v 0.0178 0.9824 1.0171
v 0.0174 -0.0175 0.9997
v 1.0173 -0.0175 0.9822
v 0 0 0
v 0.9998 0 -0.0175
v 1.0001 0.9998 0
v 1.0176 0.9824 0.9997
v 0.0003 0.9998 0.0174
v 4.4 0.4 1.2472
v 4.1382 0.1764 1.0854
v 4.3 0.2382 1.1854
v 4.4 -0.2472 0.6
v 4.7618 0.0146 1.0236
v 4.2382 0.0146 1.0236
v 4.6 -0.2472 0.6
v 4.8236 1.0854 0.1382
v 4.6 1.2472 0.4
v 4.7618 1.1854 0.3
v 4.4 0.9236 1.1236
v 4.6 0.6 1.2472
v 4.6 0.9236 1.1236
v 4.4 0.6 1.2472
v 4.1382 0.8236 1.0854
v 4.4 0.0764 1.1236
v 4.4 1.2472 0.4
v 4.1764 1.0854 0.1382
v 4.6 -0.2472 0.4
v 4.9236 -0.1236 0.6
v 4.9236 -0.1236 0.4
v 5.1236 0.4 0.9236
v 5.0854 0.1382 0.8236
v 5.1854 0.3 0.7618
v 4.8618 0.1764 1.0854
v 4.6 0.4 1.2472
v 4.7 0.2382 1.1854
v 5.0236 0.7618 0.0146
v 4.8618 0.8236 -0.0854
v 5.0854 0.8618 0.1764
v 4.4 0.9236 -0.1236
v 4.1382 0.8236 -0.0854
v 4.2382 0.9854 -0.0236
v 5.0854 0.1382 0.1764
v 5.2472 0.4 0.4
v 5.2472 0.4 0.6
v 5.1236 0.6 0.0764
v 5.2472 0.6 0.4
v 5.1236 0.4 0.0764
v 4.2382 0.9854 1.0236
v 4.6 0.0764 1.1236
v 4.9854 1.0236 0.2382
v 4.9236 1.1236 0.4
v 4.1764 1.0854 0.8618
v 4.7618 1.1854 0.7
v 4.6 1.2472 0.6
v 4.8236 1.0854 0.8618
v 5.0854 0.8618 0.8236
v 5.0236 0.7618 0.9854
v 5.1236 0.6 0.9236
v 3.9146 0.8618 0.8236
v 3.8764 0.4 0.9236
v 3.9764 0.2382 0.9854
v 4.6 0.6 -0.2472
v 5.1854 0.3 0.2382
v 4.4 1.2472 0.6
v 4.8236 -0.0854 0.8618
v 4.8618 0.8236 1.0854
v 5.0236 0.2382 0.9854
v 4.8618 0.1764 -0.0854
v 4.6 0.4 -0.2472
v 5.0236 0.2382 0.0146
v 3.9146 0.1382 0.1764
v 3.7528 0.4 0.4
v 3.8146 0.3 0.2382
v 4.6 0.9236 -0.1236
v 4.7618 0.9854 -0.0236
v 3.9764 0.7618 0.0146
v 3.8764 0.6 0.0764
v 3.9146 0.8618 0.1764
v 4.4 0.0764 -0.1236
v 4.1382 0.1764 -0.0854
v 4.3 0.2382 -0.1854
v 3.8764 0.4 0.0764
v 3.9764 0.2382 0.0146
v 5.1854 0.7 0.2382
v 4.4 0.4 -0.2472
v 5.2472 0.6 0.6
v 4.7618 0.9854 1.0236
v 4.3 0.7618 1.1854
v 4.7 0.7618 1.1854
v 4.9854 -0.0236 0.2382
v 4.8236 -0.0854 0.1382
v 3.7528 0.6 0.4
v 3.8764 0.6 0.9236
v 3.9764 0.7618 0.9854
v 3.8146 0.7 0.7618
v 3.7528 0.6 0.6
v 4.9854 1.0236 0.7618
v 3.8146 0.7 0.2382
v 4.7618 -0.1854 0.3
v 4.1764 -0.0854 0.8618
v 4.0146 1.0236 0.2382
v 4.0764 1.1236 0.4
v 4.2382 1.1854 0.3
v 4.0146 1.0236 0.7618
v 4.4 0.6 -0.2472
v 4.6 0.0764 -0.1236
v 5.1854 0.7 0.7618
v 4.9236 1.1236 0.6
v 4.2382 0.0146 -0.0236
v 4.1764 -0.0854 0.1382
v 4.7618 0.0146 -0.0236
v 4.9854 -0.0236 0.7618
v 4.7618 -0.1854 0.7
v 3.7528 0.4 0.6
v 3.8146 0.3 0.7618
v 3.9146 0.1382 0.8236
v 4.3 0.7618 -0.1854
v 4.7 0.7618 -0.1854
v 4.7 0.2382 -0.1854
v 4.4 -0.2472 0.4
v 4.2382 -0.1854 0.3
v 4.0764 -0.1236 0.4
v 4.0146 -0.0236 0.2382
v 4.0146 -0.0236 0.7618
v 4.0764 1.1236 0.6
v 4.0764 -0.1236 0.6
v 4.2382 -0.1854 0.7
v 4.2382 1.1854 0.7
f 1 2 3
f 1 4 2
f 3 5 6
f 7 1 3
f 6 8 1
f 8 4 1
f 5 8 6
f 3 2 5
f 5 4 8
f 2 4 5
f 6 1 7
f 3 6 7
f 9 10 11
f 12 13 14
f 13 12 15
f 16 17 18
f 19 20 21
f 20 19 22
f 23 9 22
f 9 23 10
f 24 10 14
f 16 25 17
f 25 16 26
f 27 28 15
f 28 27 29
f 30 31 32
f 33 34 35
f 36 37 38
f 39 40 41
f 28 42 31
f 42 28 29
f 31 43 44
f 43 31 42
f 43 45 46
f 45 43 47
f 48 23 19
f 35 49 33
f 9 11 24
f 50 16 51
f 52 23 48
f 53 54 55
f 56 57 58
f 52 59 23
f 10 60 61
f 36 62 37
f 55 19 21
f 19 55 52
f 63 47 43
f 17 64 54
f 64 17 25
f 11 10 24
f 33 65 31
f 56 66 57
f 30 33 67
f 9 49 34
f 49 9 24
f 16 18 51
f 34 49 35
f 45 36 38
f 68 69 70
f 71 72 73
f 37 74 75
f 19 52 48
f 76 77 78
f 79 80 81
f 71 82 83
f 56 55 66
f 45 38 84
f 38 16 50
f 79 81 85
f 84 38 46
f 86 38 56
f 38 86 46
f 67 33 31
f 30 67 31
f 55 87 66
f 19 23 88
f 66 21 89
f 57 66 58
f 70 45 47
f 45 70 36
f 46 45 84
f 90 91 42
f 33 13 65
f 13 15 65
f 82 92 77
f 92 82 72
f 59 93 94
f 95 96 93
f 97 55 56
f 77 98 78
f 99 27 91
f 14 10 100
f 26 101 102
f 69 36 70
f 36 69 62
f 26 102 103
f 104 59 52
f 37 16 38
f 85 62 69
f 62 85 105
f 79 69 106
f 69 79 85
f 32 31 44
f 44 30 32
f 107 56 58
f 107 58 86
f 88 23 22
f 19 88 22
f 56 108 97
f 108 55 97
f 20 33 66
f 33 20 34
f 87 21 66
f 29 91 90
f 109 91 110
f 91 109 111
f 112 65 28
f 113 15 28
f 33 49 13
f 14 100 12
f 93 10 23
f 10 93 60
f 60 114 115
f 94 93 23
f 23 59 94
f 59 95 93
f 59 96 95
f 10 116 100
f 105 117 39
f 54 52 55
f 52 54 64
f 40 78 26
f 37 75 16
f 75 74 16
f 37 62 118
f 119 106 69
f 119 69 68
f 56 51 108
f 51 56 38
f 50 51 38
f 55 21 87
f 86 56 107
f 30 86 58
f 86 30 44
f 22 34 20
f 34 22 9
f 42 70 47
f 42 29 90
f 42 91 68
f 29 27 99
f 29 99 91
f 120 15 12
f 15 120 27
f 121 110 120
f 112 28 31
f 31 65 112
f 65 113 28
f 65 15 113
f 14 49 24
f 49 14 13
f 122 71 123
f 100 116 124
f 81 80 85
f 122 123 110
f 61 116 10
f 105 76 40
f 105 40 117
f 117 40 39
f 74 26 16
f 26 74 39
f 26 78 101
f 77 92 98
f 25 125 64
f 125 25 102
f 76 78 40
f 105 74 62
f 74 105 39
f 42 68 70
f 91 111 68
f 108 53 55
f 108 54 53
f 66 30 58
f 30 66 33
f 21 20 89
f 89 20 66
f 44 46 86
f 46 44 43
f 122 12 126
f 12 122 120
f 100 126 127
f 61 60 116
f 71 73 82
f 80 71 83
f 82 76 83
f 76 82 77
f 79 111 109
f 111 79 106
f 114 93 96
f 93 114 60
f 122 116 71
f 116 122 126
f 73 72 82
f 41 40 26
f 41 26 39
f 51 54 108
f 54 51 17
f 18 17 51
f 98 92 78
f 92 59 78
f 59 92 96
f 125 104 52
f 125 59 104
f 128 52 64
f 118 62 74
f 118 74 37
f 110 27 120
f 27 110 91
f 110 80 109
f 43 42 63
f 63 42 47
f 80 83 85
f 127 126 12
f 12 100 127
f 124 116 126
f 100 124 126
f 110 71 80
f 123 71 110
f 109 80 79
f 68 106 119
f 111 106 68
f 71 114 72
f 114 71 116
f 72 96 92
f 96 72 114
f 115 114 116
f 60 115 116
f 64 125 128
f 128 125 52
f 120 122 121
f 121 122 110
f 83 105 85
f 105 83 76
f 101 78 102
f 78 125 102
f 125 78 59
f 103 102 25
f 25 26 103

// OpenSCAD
// Used to cause issue #349

// Very slightly non-planar polyhedron
polyhedron(faces=[[3,2,1,0],[7,6,5,4],[0,1,6,7],[1,2,5,6],[2,3,4,5],[3,0,7,4]],
points=[
    [0.0174497,-0.0174524,0.999695],
    [1.0173,-0.0174524,0.982243],
    [1.0176,0.982395,0.999693],
    [0.0177543,0.982395,1.01715],
    [0.000304586,0.999848,0.0174497],
    [1.00015,0.999848,-0.00000265809],
    [0.999848,-0.0000000000000271051,-0.0174524],
    [0,0,0]]);

// Really non-planar polyhedron
translate([2,0,0]) polyhedron(faces=[[3,2,1,0],[7,6,5,4],[0,1,6,7],[1,2,5,6],[2,3,4,5],[3,0,7,4]],
points=[
    [0,0,1],
    [1,0.2,1],
    [1,1,1],
    [0,1,1],
    [0,1,0],
    [1,1,0],
    [1,0,0],
    [0,0,0]]);

// Real-world example: truncated icosidodecahedron
translate([4.5,0.5,0.5]) scale(0.02) polyhedron(points = [
[-10., -13.090169943749475, -34.270509831248425], 
[-10., -13.090169943749475, 34.270509831248425], 
[-10., 13.090169943749475, -34.270509831248425], 
[-10., 13.090169943749475, 34.270509831248425], 
[-5., -5., -37.3606797749979], [-5., -5., 37.3606797749979], 
[-5., 5., -37.3606797749979], [-5., 5., 37.3606797749979], 
[-5., -37.3606797749979, -5.], [-5., -37.3606797749979, 5.], 
[-5., -21.18033988749895, -31.18033988749895], 
[-5., -21.18033988749895, 31.18033988749895], [-5., 37.3606797749979, -5.], 
[-5., 37.3606797749979, 5.], [-5., 21.18033988749895, -31.18033988749895], 
[-5., 21.18033988749895, 31.18033988749895], [5., -5., -37.3606797749979], 
[5., -5., 37.3606797749979], [5., 5., -37.3606797749979], 
[5., 5., 37.3606797749979], [5., -37.3606797749979, -5.], 
[5., -37.3606797749979, 5.], [5., -21.18033988749895, -31.18033988749895], 
[5., -21.18033988749895, 31.18033988749895], [5., 37.3606797749979, -5.], 
[5., 37.3606797749979, 5.], [5., 21.18033988749895, -31.18033988749895], 
[5., 21.18033988749895, 31.18033988749895], [10., -13.090169943749475, 
 -34.270509831248425], [10., -13.090169943749475, 34.270509831248425], 
[10., 13.090169943749475, -34.270509831248425], 
[10., 13.090169943749475, 34.270509831248425], 
[-34.270509831248425, -10., -13.090169943749475], 
[-34.270509831248425, -10., 13.090169943749475], 
[-34.270509831248425, 10., -13.090169943749475], 
[-34.270509831248425, 10., 13.090169943749475], 
[-29.270509831248425, -18.090169943749473, -16.18033988749895], 
[-29.270509831248425, -18.090169943749473, 16.18033988749895], 
[-29.270509831248425, 18.090169943749473, -16.18033988749895], 
[-29.270509831248425, 18.090169943749473, 16.18033988749895], 
[-18.090169943749473, -16.18033988749895, -29.270509831248425], 
[-18.090169943749473, -16.18033988749895, 29.270509831248425], 
[-18.090169943749473, 16.18033988749895, -29.270509831248425], 
[-18.090169943749473, 16.18033988749895, 29.270509831248425], 
[-13.090169943749475, -34.270509831248425, -10.], 
[-13.090169943749475, -34.270509831248425, 10.], 
[-13.090169943749475, -24.270509831248425, -26.18033988749895], 
[-13.090169943749475, -24.270509831248425, 26.18033988749895], 
[-13.090169943749475, 24.270509831248425, -26.18033988749895], 
[-13.090169943749475, 24.270509831248425, 26.18033988749895], 
[-13.090169943749475, 34.270509831248425, -10.], 
[-13.090169943749475, 34.270509831248425, 10.], 
[-26.18033988749895, -13.090169943749475, -24.270509831248425], 
[-26.18033988749895, -13.090169943749475, 24.270509831248425], 
[-26.18033988749895, 13.090169943749475, -24.270509831248425], 
[-26.18033988749895, 13.090169943749475, 24.270509831248425], 
[-37.3606797749979, -5., -5.], [-37.3606797749979, -5., 5.], 
[-37.3606797749979, 5., -5.], [-37.3606797749979, 5., 5.], 
[-16.18033988749895, -29.270509831248425, -18.090169943749473], 
[-16.18033988749895, -29.270509831248425, 18.090169943749473], 
[-16.18033988749895, 29.270509831248425, -18.090169943749473], 
[-16.18033988749895, 29.270509831248425, 18.090169943749473], 
[-31.18033988749895, -5., -21.18033988749895], 
[-31.18033988749895, -5., 21.18033988749895], 
[-31.18033988749895, 5., -21.18033988749895], 
[-31.18033988749895, 5., 21.18033988749895], 
[-21.18033988749895, -31.18033988749895, -5.], 
[-21.18033988749895, -31.18033988749895, 5.], 
[-21.18033988749895, 31.18033988749895, -5.], 
[-21.18033988749895, 31.18033988749895, 5.], 
[-24.270509831248425, -26.18033988749895, -13.090169943749475], 
[-24.270509831248425, -26.18033988749895, 13.090169943749475], 
[-24.270509831248425, 26.18033988749895, -13.090169943749475], 
[-24.270509831248425, 26.18033988749895, 13.090169943749475], 
[16.18033988749895, -29.270509831248425, -18.090169943749473], 
[16.18033988749895, -29.270509831248425, 18.090169943749473], 
[16.18033988749895, 29.270509831248425, -18.090169943749473], 
[16.18033988749895, 29.270509831248425, 18.090169943749473], 
[24.270509831248425, -26.18033988749895, -13.090169943749475], 
[24.270509831248425, -26.18033988749895, 13.090169943749475], 
[24.270509831248425, 26.18033988749895, -13.090169943749475], 
[24.270509831248425, 26.18033988749895, 13.090169943749475], 
[37.3606797749979, -5., -5.], [37.3606797749979, -5., 5.], 
[37.3606797749979, 5., -5.], [37.3606797749979, 5., 5.], 
[21.18033988749895, -31.18033988749895, -5.], 
[21.18033988749895, -31.18033988749895, 5.], 
[21.18033988749895, 31.18033988749895, -5.], 
[21.18033988749895, 31.18033988749895, 5.], 
[13.090169943749475, -34.270509831248425, -10.], 
[13.090169943749475, -34.270509831248425, 10.], 
[13.090169943749475, -24.270509831248425, -26.18033988749895], 
[13.090169943749475, -24.270509831248425, 26.18033988749895], 
[13.090169943749475, 24.270509831248425, -26.18033988749895], 
[13.090169943749475, 24.270509831248425, 26.18033988749895], 
[13.090169943749475, 34.270509831248425, -10.], 
[13.090169943749475, 34.270509831248425, 10.], 
[26.18033988749895, -13.090169943749475, -24.270509831248425], 
[26.18033988749895, -13.090169943749475, 24.270509831248425], 
[26.18033988749895, 13.090169943749475, -24.270509831248425], 
[26.18033988749895, 13.090169943749475, 24.270509831248425], 
[31.18033988749895, -5., -21.18033988749895], 
[31.18033988749895, -5., 21.18033988749895], 
[31.18033988749895, 5., -21.18033988749895], 
[31.18033988749895, 5., 21.18033988749895], 
[18.090169943749473, -16.18033988749895, -29.270509831248425], 
[18.090169943749473, -16.18033988749895, 29.270509831248425], 
[18.090169943749473, 16.18033988749895, -29.270509831248425], 
[18.090169943749473, 16.18033988749895, 29.270509831248425], 
[29.270509831248425, -18.090169943749473, -16.18033988749895], 
[29.270509831248425, -18.090169943749473, 16.18033988749895], 
[29.270509831248425, 18.090169943749473, -16.18033988749895], 
[29.270509831248425, 18.090169943749473, 16.18033988749895], 
[34.270509831248425, -10., -13.090169943749475], 
[34.270509831248425, -10., 13.090169943749475], 
[34.270509831248425, 10., -13.090169943749475], 
[34.270509831248425, 10., 13.090169943749475]],faces = 
[[41, 53, 65, 67, 55, 43, 3, 7, 5, 1], [100, 104, 106, 102, 110, 30, 18, 16, 
 28, 108], [11, 1, 5, 17, 29, 23], [18, 30, 26, 14, 2, 6], 
[33, 37, 73, 69, 68, 72, 36, 32, 56, 57], [91, 90, 82, 114, 118, 86, 87, 
 119, 115, 83], [81, 113, 117, 85, 84, 116, 112, 80, 88, 89], 
[59, 58, 34, 38, 74, 70, 71, 75, 39, 35], [0, 10, 22, 28, 16, 4], 
[15, 27, 31, 19, 7, 3], [64, 52, 40, 0, 4, 6, 2, 42, 54, 66], 
[19, 31, 111, 103, 107, 105, 101, 109, 29, 17], [96, 110, 102, 114, 82, 78], 
[53, 41, 47, 61, 73, 37], [43, 49, 15, 3], [94, 108, 28, 22], 
[23, 29, 109, 95], [2, 14, 48, 42], [36, 72, 60, 46, 40, 52], 
[79, 83, 115, 103, 111, 97], [69, 45, 9, 8, 44, 68], 
[24, 98, 90, 91, 99, 25], [77, 95, 109, 101, 113, 81], 
[42, 48, 62, 74, 38, 54], [40, 46, 10, 0], [97, 111, 31, 27], 
[44, 8, 20, 92, 76, 94, 22, 10, 46, 60], [63, 51, 13, 25, 99, 79, 97, 27, 
 15, 49], [26, 30, 110, 96], [1, 11, 47, 41], [55, 39, 75, 63, 49, 43], 
[80, 112, 100, 108, 94, 76], [48, 14, 26, 96, 78, 98, 24, 12, 50, 62], 
[61, 47, 11, 23, 95, 77, 93, 21, 9, 45], [71, 70, 50, 12, 13, 51], 
[93, 89, 88, 92, 20, 21], [102, 106, 118, 114], [65, 53, 37, 33], 
[74, 62, 50, 70], [77, 81, 89, 93], [101, 105, 117, 113], [66, 54, 38, 34], 
[73, 61, 45, 69], [78, 82, 90, 98], [32, 36, 52, 64], [115, 119, 107, 103], 
[92, 88, 80, 76], [71, 51, 63, 75], [56, 32, 64, 66, 34, 58], 
[107, 119, 87, 85, 117, 105], [35, 39, 55, 67], [112, 116, 104, 100], 
[99, 91, 83, 79], [68, 44, 60, 72], [57, 59, 35, 67, 65, 33], 
[116, 84, 86, 118, 106, 104], [4, 16, 18, 6], [7, 19, 17, 5], 
[12, 24, 25, 13], [9, 21, 20, 8], [56, 58, 59, 57], [85, 87, 86, 84]]
);
